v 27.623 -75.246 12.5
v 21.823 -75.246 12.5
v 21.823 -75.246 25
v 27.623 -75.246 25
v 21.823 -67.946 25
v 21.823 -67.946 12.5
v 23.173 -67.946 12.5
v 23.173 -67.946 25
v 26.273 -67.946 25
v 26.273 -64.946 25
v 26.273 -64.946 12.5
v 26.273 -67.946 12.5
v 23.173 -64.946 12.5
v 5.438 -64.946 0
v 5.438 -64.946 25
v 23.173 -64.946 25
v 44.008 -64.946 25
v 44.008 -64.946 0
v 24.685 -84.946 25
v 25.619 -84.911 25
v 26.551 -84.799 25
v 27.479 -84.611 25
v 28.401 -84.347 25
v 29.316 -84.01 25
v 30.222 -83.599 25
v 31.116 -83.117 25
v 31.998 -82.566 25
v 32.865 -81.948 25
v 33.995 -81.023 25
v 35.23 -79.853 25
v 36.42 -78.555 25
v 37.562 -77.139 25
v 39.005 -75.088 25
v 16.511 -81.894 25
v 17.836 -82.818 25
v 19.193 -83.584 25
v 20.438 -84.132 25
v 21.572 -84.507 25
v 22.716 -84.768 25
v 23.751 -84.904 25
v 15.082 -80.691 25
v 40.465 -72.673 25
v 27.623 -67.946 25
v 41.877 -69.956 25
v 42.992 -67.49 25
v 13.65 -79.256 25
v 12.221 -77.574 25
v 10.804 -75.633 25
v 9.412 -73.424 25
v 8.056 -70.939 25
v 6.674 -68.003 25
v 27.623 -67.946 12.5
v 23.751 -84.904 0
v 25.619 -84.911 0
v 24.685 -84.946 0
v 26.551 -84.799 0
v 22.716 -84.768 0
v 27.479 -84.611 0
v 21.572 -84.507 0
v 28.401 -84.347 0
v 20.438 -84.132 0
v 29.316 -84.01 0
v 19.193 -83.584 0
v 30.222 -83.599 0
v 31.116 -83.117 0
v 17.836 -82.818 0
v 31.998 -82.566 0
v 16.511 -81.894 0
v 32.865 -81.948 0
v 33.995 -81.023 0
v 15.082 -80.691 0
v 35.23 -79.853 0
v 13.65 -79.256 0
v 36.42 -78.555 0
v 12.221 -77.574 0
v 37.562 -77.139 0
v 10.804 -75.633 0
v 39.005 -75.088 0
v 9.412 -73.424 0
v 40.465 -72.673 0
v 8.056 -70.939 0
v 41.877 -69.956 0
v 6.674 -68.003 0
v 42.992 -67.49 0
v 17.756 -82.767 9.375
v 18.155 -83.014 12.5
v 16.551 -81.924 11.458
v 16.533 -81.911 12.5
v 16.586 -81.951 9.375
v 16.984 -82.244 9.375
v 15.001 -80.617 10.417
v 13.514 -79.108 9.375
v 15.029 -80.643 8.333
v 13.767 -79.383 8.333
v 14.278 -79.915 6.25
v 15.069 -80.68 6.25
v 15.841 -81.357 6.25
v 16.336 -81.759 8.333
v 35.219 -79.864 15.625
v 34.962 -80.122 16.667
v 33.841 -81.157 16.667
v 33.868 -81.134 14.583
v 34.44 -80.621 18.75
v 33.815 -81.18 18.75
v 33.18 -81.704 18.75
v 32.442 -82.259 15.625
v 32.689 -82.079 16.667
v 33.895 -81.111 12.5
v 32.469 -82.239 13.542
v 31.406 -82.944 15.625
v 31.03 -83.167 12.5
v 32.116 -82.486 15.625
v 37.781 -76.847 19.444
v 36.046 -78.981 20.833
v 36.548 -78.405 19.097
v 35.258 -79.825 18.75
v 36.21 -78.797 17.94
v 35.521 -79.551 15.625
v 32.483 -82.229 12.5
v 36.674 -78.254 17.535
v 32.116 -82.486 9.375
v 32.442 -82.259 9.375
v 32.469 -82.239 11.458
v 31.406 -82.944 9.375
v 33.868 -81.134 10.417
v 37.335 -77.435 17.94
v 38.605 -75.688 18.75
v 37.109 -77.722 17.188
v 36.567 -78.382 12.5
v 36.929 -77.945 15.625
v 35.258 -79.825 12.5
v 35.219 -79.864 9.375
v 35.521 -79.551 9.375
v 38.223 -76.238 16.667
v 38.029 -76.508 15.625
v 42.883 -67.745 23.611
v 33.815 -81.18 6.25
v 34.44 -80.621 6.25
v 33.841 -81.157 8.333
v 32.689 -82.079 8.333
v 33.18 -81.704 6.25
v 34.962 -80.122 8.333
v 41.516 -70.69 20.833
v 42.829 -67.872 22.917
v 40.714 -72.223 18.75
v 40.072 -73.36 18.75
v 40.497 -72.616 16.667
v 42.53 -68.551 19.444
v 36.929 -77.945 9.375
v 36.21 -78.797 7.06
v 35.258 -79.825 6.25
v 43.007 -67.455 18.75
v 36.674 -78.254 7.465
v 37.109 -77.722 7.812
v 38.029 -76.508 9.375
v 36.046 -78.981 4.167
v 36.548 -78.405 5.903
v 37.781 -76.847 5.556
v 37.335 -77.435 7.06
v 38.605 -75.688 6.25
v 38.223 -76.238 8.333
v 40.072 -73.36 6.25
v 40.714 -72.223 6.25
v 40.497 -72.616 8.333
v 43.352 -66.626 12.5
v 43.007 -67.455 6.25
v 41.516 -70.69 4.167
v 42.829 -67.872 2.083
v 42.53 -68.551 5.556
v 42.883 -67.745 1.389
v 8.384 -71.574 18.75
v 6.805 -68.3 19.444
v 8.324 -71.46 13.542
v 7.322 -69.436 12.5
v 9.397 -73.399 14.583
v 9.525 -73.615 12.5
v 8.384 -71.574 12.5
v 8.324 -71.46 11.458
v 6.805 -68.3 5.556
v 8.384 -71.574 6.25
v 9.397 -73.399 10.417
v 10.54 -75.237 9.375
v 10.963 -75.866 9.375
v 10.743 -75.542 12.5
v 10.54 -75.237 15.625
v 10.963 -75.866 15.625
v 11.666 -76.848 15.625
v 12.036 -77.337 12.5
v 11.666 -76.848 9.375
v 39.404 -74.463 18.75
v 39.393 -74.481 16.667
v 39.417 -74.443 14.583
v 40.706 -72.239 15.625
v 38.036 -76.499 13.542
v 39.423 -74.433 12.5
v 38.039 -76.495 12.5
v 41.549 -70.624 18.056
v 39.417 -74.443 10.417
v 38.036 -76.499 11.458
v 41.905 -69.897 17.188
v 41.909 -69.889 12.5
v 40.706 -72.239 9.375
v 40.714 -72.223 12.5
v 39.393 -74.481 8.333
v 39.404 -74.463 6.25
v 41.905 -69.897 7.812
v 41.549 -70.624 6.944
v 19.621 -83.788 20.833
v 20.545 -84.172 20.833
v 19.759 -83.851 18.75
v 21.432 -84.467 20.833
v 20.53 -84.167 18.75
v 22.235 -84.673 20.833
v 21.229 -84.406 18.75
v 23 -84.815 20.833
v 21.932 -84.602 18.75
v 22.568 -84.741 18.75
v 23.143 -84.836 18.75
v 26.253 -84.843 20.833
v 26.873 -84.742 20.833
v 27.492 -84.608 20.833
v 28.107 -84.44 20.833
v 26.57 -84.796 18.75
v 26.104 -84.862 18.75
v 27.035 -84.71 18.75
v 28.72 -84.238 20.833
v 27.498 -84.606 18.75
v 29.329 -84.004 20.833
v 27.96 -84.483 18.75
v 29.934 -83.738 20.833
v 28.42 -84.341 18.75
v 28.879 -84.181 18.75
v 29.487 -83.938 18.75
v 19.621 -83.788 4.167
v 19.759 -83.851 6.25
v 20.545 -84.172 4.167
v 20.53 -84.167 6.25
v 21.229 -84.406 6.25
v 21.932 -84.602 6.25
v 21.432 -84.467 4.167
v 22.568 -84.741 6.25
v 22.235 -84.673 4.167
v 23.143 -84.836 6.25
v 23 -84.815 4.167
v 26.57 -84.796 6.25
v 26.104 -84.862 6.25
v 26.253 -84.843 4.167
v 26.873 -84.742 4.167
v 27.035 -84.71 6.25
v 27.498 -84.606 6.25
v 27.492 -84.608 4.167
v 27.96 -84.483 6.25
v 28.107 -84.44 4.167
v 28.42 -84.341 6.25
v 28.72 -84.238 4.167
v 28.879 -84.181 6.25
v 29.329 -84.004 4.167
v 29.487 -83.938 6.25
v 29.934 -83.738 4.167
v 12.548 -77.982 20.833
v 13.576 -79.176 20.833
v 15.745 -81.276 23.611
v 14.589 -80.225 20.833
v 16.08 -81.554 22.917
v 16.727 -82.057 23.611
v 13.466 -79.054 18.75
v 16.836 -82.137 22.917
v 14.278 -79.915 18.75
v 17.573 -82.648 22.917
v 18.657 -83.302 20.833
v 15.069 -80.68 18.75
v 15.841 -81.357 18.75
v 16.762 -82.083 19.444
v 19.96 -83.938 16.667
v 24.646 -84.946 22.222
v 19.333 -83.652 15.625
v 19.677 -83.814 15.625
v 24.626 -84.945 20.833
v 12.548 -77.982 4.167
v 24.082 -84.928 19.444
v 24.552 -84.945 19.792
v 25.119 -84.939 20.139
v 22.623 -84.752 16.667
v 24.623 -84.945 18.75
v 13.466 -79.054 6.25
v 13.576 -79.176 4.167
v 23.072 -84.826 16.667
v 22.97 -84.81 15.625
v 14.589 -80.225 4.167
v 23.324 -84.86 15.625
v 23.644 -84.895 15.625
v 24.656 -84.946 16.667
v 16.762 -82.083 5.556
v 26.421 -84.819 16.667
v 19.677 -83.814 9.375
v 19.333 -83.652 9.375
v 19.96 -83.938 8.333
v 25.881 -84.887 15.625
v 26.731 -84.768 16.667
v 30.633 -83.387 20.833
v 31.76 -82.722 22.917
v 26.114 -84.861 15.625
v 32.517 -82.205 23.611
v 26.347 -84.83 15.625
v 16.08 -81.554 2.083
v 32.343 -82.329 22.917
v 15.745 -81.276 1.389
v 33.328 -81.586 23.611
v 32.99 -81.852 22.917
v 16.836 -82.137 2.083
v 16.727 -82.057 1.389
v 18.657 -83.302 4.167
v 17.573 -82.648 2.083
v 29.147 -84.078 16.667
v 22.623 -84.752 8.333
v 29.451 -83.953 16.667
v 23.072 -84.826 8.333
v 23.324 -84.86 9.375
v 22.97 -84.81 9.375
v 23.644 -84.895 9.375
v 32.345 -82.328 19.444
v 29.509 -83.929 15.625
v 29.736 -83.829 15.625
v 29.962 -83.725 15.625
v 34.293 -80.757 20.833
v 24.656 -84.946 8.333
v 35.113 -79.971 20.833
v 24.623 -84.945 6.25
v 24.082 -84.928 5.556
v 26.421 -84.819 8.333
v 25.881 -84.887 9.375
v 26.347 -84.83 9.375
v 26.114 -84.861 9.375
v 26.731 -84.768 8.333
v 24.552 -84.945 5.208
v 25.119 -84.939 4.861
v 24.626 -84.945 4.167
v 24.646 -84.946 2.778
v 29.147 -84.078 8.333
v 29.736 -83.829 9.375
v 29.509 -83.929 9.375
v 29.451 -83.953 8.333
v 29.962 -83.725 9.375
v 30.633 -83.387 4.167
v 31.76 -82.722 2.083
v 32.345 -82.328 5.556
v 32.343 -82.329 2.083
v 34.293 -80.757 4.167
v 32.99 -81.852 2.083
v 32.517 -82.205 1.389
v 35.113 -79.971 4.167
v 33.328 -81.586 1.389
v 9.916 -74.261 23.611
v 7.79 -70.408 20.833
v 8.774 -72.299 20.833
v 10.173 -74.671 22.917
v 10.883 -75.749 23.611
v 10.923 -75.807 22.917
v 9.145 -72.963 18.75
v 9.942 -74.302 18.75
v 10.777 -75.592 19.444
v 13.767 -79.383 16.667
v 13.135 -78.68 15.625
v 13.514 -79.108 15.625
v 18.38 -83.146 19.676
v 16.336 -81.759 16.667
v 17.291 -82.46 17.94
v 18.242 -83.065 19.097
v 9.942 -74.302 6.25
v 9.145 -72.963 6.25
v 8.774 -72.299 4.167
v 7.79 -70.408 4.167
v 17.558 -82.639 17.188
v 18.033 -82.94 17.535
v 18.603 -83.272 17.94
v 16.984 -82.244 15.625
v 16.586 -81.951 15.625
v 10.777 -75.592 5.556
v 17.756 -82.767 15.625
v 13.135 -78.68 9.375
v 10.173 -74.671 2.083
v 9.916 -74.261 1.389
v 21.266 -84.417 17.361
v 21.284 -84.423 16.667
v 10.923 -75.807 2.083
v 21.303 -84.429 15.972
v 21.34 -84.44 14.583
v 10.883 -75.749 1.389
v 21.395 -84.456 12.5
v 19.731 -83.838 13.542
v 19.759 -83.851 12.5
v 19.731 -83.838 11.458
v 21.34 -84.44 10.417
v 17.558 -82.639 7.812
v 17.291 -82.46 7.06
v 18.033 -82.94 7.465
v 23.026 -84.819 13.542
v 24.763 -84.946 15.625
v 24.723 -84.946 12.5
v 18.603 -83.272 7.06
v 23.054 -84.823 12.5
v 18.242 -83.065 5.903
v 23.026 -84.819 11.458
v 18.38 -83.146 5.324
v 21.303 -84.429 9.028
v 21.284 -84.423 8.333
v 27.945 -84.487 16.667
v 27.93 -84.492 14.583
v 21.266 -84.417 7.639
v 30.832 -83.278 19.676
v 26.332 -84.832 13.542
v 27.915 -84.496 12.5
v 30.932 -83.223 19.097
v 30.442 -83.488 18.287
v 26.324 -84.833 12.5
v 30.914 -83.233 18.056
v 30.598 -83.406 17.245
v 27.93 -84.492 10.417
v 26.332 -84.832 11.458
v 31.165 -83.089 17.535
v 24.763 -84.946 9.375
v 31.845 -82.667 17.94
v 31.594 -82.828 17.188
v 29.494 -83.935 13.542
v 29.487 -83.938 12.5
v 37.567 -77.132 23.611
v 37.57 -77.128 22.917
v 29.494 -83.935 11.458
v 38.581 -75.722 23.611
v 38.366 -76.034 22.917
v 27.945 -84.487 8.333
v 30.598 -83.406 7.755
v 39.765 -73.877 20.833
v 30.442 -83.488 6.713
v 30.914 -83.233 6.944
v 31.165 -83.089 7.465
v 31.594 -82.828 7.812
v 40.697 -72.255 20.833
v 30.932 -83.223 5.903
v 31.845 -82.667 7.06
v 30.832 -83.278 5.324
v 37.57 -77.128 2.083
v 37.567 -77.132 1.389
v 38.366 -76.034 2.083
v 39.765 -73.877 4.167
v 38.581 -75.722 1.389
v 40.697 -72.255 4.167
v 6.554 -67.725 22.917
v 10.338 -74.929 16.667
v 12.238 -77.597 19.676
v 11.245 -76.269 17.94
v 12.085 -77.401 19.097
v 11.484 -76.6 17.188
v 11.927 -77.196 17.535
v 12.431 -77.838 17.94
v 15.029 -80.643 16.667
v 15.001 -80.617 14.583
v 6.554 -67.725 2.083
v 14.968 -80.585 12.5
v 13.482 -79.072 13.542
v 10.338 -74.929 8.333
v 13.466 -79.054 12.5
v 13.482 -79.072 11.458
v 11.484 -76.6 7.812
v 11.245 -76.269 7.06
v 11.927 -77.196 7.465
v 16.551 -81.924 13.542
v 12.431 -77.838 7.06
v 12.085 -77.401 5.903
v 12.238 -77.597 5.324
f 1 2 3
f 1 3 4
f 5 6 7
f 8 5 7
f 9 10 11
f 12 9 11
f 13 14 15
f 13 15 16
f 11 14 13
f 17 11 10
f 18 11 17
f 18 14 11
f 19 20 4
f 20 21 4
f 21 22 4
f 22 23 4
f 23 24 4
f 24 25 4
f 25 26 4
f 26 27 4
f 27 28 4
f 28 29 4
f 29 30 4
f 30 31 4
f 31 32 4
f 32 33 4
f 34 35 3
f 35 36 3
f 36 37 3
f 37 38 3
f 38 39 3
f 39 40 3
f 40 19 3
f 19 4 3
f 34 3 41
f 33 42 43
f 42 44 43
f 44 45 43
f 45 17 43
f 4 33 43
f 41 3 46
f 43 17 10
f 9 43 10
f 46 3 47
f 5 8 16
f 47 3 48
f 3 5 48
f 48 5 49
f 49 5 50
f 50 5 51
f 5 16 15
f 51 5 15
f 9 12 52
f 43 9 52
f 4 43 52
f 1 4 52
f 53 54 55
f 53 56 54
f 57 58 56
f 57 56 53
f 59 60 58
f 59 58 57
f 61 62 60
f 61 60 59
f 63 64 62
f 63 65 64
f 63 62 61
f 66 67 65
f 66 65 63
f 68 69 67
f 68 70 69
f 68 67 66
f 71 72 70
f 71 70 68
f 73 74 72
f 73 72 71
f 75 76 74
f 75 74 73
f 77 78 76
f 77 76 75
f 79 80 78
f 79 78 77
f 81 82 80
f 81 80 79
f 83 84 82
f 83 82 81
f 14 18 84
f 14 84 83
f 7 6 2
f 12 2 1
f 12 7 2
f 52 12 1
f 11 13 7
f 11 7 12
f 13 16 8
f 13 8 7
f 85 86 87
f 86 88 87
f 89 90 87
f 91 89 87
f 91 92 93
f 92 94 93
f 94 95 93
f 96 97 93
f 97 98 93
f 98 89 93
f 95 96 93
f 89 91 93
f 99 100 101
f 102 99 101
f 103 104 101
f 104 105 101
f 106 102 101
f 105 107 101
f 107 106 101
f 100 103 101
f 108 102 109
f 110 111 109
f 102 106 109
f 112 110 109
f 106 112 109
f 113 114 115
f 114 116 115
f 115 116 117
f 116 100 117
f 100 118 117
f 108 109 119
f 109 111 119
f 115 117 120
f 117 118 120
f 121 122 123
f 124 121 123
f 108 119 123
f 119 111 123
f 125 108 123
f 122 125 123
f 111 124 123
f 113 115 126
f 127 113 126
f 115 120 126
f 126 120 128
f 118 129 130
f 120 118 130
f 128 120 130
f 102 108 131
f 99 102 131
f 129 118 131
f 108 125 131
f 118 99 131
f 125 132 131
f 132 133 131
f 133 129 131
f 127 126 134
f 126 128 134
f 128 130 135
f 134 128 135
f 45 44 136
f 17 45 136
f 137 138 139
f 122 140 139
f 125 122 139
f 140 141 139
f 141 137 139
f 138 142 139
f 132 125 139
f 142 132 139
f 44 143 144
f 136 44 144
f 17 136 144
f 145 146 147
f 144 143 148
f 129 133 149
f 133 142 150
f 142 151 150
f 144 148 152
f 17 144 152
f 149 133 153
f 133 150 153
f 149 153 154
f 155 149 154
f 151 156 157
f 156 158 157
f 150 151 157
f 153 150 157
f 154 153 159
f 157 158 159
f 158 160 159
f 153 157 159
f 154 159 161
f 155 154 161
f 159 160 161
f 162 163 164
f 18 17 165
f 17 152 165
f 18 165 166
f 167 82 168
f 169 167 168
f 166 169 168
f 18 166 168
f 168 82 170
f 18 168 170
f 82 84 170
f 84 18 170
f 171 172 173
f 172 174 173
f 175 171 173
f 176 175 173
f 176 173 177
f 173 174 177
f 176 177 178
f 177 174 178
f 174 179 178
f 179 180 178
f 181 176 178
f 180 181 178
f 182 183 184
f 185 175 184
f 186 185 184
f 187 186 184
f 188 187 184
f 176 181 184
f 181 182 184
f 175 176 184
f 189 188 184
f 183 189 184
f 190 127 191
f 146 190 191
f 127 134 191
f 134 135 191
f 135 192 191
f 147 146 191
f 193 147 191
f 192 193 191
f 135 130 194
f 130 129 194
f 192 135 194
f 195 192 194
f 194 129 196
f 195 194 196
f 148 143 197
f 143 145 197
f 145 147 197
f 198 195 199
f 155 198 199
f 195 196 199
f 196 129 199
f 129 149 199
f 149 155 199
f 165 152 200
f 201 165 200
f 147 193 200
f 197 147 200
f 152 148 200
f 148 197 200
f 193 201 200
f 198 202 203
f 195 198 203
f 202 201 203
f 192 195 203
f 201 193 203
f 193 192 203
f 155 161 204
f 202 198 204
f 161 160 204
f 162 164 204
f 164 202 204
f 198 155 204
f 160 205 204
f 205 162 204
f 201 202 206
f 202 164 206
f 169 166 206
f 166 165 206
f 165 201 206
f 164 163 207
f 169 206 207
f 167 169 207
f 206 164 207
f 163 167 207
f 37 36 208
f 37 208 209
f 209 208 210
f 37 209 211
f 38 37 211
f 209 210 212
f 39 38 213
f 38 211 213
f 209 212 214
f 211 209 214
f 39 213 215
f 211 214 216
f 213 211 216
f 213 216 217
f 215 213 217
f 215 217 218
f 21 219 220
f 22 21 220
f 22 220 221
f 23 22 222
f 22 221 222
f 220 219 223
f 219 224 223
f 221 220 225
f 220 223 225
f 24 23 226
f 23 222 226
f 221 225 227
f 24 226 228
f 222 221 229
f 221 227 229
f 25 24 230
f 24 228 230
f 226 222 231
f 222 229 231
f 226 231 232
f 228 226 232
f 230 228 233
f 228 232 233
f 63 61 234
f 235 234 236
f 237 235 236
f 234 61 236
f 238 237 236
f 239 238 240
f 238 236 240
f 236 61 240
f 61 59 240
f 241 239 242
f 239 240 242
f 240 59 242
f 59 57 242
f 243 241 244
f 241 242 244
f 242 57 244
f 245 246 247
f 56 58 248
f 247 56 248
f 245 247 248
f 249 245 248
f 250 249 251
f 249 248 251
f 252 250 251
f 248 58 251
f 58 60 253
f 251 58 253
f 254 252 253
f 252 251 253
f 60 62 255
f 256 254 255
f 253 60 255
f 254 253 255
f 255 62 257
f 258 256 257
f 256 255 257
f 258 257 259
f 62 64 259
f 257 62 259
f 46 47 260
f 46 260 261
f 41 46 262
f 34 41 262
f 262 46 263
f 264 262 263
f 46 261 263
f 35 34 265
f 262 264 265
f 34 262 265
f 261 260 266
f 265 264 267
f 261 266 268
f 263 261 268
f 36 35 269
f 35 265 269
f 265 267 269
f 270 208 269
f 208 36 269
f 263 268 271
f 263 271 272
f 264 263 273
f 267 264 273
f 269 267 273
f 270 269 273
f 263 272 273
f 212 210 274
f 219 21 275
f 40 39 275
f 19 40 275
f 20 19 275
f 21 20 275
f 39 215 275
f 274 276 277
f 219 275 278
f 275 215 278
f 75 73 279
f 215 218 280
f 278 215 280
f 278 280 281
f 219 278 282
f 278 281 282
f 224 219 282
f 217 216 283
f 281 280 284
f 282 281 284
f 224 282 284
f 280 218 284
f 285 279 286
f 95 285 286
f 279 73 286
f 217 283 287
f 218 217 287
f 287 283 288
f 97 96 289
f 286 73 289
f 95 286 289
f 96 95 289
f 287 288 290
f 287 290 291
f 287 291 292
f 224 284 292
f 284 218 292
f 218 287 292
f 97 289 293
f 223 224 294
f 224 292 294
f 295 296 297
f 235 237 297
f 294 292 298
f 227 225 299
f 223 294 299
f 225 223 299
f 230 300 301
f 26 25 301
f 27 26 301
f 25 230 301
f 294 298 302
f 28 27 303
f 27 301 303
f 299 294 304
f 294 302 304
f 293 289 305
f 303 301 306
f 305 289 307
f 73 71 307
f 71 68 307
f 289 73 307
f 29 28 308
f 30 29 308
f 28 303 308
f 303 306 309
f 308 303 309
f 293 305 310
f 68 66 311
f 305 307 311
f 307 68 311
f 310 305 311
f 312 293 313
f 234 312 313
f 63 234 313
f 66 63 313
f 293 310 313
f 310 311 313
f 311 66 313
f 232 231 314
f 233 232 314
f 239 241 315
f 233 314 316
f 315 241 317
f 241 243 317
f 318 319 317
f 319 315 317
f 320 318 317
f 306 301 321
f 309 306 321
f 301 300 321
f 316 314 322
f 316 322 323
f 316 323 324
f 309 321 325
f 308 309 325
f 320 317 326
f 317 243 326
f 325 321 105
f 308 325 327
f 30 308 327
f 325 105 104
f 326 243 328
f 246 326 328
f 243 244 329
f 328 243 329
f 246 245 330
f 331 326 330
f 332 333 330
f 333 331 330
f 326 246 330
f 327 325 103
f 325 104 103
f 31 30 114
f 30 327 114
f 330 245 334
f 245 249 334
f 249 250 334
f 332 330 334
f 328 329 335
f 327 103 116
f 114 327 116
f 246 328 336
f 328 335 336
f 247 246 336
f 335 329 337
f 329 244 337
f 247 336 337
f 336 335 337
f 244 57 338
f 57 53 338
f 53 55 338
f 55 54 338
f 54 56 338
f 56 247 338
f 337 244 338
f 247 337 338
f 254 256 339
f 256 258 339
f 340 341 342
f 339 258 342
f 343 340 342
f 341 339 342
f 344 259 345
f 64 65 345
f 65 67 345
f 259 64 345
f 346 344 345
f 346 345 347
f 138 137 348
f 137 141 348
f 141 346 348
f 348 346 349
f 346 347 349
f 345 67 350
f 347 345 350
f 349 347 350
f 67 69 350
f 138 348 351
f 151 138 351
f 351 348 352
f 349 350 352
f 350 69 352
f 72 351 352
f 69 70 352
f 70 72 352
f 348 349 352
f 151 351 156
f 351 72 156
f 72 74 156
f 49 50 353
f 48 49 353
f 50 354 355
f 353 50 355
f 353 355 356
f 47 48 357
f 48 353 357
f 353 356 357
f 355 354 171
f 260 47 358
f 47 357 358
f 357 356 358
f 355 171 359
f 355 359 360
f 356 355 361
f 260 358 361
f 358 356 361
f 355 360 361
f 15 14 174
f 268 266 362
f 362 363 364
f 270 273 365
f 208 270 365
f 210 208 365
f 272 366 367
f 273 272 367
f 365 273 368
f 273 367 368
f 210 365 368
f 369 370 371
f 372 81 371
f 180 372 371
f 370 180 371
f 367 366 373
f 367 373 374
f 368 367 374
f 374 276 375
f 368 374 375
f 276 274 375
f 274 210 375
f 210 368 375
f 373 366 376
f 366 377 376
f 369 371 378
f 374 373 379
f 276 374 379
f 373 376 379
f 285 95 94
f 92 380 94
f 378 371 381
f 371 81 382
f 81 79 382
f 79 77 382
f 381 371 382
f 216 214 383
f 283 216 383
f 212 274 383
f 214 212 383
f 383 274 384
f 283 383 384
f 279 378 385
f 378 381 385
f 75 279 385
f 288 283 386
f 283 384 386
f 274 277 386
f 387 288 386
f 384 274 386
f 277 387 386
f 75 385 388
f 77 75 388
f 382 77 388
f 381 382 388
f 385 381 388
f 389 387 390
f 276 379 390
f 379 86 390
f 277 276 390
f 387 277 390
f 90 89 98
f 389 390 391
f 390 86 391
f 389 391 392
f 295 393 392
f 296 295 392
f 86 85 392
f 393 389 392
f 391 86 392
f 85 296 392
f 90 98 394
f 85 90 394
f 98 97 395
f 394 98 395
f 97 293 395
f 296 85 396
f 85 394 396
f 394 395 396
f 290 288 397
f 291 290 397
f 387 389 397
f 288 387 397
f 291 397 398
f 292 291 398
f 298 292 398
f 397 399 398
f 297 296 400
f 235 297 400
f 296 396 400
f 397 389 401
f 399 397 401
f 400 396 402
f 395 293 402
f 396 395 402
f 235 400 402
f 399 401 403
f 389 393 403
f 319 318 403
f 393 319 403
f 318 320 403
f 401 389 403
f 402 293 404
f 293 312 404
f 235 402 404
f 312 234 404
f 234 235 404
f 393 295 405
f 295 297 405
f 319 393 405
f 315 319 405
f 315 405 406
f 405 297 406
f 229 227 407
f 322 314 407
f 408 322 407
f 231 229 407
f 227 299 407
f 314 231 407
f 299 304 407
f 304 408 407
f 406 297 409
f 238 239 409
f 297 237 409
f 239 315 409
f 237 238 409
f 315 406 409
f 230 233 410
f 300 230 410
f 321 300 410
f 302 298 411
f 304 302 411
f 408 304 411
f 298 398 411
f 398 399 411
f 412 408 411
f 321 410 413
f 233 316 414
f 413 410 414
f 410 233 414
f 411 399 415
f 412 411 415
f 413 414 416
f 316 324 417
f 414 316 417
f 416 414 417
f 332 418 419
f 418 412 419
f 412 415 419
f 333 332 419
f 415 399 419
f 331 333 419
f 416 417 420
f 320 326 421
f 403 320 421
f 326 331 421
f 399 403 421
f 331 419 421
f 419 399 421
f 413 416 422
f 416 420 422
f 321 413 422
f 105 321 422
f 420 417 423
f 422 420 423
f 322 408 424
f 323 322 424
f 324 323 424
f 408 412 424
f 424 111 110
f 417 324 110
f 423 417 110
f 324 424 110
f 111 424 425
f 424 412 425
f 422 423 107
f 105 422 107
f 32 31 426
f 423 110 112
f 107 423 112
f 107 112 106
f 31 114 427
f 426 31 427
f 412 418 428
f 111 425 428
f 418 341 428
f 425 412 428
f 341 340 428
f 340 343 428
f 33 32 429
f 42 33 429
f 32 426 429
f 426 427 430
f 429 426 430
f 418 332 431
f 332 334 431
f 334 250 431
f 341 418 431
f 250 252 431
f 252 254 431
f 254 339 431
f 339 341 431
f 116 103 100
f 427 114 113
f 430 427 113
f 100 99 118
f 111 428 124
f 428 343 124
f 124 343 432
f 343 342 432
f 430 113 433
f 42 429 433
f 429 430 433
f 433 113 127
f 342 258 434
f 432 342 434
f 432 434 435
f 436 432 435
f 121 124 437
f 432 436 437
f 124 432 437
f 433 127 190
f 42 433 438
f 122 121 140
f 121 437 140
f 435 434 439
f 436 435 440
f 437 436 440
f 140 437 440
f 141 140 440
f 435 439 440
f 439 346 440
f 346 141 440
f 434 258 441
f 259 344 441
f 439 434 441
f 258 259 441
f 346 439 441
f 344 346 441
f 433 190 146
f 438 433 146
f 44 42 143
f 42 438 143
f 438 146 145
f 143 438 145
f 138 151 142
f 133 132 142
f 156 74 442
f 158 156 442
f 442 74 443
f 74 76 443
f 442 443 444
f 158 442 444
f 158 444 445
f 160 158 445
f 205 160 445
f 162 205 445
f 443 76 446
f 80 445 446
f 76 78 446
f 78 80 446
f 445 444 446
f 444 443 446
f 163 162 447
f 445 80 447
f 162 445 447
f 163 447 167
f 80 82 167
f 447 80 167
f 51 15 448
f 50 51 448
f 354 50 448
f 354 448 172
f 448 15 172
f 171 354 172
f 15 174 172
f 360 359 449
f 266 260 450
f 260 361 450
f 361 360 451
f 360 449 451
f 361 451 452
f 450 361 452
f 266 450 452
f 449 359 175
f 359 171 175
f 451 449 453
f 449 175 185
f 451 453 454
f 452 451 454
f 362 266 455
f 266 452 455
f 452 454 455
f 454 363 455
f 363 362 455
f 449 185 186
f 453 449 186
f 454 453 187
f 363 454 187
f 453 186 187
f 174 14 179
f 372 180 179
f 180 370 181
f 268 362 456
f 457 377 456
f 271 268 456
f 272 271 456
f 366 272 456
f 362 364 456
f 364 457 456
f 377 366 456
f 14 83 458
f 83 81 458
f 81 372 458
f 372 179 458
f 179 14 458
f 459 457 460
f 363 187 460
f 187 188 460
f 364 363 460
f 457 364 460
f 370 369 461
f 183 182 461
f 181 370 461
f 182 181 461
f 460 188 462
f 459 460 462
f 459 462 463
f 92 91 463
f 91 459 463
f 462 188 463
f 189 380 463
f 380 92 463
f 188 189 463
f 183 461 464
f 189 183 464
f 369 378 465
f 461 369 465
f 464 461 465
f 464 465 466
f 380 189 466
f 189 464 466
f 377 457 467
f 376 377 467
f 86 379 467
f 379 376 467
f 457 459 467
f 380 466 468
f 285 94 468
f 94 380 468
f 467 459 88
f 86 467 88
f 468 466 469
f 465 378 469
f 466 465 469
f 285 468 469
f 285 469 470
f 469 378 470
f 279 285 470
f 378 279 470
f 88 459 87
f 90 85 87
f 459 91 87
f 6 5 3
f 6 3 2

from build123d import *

# Parameters (mm, degrees)
SALIENTE_EXTRUIR6_DEPTH = 25
CROQUIS10_W             = 3.1
CROQUIS10_H             = 12.5
CORTAR_EXTRUIR1_DEPTH   = 3
CROQUIS14_W             = 5.8
CROQUIS14_H             = 12.5
CORTAR_EXTRUIR3_DEPTH   = 7.3


with BuildPart() as part:
    # Croquis9 → Saliente-Extruir6 (new body)
    with BuildSketch(Plane.XY):
        with BuildLine():
            Line((5.43844596, -64.945905041), (44.007906752, -64.945905041))
            add(Edge.make_bspline(
                [(5.43844596, -64.945905041), (24.723176356, -116.374476469), (44.007906752, -64.945905041)],
                knots=[5.402163981, 5.402163981, 5.402163981, 7.164206633, 7.164206633, 7.164206633], degree=2, weights=[1, 0.636363636, 1]))
        make_face()
    extrude(amount=SALIENTE_EXTRUIR6_DEPTH)

    # Croquis10 → Cortar-Extruir1 (cut)
    with BuildSketch(Plane(origin=(0, -64.945905041, 0), x_dir=(1, 0, 0), z_dir=(0, 1, 0))):
        with Locations((24.722906752, -18.75)):
            Rectangle(CROQUIS10_W, CROQUIS10_H)
    extrude(amount=-CORTAR_EXTRUIR1_DEPTH, mode=Mode.SUBTRACT)

    # Croquis14 → Cortar-Extruir3 (cut)
    with BuildSketch(Plane(origin=(0, -67.945905041, 0), x_dir=(1, 0, 0), z_dir=(0, 1, 0))):
        with Locations((24.722906752, -18.75)):
            Rectangle(CROQUIS14_W, CROQUIS14_H)
    extrude(amount=-CORTAR_EXTRUIR3_DEPTH, mode=Mode.SUBTRACT)


solid = part.part
